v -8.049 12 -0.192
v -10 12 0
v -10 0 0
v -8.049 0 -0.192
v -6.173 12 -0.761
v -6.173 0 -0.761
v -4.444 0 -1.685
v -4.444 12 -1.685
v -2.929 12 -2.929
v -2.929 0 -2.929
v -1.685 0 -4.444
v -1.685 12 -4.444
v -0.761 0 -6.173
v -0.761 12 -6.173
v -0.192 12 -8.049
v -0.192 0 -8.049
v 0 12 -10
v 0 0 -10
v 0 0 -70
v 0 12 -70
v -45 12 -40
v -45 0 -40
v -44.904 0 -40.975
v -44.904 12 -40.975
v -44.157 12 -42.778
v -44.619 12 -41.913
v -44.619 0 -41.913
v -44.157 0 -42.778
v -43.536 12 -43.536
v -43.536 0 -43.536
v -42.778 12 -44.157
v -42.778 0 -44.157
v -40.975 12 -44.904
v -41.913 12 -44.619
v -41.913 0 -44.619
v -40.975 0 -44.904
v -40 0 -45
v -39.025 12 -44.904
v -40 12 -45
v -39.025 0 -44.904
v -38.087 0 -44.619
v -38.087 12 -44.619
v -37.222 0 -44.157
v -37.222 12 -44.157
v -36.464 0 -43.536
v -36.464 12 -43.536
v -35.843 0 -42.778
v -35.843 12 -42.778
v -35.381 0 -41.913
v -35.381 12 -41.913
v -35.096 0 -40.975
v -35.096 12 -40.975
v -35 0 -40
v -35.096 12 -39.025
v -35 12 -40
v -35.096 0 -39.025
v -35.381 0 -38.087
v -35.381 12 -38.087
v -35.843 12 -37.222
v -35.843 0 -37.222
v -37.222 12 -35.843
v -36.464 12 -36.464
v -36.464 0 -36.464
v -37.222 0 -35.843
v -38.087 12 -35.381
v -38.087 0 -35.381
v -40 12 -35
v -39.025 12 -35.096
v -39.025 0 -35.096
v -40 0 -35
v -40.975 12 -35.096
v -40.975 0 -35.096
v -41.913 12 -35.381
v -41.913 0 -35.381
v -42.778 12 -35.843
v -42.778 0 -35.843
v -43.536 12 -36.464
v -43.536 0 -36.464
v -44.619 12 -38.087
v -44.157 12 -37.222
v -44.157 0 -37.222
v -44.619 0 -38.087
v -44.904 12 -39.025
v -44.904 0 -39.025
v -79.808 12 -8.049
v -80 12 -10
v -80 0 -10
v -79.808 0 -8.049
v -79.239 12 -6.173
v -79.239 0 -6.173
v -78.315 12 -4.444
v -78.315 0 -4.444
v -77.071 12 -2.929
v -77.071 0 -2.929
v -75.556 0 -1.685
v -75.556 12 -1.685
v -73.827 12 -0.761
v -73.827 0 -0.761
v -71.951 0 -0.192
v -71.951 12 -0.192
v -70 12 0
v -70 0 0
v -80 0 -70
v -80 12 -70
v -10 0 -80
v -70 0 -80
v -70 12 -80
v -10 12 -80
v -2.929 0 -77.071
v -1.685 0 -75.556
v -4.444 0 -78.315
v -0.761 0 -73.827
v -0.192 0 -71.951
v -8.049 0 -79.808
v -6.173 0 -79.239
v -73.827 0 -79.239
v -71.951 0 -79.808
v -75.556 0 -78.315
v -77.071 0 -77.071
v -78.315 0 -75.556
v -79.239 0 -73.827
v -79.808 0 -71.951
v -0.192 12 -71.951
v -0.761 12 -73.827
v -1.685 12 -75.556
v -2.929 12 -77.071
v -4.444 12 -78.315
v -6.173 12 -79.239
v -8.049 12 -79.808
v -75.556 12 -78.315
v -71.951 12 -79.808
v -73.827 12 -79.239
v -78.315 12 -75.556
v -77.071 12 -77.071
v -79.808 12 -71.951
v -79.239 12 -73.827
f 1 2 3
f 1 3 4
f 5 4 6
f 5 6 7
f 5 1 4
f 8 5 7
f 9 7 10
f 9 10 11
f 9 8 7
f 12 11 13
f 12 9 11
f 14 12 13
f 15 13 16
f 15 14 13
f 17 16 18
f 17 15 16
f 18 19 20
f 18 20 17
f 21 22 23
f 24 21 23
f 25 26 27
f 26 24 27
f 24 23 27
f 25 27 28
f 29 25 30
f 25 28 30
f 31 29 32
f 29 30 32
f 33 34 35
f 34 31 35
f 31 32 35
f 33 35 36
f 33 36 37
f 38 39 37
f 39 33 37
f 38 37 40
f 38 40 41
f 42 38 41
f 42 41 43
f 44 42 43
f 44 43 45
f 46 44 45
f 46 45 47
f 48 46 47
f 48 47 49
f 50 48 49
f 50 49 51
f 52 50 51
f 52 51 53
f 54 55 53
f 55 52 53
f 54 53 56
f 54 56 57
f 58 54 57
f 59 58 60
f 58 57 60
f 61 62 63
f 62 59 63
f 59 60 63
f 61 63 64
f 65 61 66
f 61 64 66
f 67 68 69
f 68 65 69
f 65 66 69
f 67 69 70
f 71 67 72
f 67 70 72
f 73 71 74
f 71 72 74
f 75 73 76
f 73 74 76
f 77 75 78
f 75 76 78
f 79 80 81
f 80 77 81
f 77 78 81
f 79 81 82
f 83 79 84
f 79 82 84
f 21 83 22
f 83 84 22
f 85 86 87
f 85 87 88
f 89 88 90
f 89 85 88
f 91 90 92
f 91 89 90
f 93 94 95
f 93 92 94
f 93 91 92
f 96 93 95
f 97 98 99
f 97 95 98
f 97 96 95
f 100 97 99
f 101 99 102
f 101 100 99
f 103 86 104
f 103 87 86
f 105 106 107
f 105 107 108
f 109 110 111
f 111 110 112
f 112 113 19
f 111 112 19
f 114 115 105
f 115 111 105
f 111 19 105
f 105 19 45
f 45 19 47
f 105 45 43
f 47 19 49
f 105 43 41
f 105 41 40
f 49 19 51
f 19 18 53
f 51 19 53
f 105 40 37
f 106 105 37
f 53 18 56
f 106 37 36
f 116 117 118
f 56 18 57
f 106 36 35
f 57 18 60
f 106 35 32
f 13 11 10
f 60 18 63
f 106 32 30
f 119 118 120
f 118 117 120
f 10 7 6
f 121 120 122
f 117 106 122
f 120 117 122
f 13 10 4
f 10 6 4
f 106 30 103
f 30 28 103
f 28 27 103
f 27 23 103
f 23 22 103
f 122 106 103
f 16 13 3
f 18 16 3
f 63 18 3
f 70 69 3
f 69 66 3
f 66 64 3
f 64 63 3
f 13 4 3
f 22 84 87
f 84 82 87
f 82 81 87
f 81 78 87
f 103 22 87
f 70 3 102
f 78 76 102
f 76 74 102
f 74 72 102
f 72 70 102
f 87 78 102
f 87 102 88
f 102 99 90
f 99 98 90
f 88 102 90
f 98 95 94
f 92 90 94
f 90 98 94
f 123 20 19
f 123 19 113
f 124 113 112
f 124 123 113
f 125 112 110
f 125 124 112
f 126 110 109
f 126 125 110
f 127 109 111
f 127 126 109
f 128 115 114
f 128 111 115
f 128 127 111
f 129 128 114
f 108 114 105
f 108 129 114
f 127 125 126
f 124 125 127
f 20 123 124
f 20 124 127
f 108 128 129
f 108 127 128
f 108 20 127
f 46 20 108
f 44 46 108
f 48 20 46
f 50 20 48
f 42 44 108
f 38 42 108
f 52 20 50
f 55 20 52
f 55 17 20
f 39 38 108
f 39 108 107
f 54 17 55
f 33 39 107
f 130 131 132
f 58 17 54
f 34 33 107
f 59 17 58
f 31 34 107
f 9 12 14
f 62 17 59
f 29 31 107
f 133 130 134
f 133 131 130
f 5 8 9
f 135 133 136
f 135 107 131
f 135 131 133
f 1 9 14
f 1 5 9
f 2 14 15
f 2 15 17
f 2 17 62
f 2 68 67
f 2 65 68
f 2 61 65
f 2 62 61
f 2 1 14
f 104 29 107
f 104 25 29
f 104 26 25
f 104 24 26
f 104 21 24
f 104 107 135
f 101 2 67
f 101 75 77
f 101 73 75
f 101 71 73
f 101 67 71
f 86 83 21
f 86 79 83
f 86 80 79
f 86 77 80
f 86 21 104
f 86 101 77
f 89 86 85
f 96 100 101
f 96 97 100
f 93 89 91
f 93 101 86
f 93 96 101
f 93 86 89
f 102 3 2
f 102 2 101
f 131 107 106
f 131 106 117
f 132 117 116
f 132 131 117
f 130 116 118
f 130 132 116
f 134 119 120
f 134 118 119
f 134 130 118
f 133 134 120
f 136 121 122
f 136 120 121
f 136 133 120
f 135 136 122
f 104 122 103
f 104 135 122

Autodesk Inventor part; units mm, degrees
ref_plane "YZ Plane" through (0, 0, 0) normal (1, 0, 0) x (0, 1, 0)
ref_plane "XZ Plane" through (0, 0, 0) normal (0, 1, 0) x (-1, 0, 0)
ref_plane "XY Plane" through (0, 0, 0) normal (0, 0, 1) x (1, 0, 0)
sketch "Esboço1" plane through (0, 0, 0) normal (0, 1, 0) x (-1, 0, 0)
  line L0 (0, 0) -> (80, 0)
  line L1 (80, 0) -> (80, -80)
  line L2 (80, -80) -> (0, -80)
  line L3 (0, -80) -> (0, 0)
  circle A0 centre (40, -40) radius 5
  dimension "d0" = 80
  dimension "d1" = 80
  dimension "d2" = 10
extrude "Extrusão1" add sketch "Esboço1" along normal blind 12
fillet "Arredondamento1" radius 10 4 edges at (-80, 6, 0) (0, 6, 0) (0, 6, -80) (-80, 6, -80)
sketch "Esboço2" plane through (0, 12, 0) normal (0, 1, 0) x (1, 0, 0)
  point P0 (0, 0)
properties part number "Corpo_1"
